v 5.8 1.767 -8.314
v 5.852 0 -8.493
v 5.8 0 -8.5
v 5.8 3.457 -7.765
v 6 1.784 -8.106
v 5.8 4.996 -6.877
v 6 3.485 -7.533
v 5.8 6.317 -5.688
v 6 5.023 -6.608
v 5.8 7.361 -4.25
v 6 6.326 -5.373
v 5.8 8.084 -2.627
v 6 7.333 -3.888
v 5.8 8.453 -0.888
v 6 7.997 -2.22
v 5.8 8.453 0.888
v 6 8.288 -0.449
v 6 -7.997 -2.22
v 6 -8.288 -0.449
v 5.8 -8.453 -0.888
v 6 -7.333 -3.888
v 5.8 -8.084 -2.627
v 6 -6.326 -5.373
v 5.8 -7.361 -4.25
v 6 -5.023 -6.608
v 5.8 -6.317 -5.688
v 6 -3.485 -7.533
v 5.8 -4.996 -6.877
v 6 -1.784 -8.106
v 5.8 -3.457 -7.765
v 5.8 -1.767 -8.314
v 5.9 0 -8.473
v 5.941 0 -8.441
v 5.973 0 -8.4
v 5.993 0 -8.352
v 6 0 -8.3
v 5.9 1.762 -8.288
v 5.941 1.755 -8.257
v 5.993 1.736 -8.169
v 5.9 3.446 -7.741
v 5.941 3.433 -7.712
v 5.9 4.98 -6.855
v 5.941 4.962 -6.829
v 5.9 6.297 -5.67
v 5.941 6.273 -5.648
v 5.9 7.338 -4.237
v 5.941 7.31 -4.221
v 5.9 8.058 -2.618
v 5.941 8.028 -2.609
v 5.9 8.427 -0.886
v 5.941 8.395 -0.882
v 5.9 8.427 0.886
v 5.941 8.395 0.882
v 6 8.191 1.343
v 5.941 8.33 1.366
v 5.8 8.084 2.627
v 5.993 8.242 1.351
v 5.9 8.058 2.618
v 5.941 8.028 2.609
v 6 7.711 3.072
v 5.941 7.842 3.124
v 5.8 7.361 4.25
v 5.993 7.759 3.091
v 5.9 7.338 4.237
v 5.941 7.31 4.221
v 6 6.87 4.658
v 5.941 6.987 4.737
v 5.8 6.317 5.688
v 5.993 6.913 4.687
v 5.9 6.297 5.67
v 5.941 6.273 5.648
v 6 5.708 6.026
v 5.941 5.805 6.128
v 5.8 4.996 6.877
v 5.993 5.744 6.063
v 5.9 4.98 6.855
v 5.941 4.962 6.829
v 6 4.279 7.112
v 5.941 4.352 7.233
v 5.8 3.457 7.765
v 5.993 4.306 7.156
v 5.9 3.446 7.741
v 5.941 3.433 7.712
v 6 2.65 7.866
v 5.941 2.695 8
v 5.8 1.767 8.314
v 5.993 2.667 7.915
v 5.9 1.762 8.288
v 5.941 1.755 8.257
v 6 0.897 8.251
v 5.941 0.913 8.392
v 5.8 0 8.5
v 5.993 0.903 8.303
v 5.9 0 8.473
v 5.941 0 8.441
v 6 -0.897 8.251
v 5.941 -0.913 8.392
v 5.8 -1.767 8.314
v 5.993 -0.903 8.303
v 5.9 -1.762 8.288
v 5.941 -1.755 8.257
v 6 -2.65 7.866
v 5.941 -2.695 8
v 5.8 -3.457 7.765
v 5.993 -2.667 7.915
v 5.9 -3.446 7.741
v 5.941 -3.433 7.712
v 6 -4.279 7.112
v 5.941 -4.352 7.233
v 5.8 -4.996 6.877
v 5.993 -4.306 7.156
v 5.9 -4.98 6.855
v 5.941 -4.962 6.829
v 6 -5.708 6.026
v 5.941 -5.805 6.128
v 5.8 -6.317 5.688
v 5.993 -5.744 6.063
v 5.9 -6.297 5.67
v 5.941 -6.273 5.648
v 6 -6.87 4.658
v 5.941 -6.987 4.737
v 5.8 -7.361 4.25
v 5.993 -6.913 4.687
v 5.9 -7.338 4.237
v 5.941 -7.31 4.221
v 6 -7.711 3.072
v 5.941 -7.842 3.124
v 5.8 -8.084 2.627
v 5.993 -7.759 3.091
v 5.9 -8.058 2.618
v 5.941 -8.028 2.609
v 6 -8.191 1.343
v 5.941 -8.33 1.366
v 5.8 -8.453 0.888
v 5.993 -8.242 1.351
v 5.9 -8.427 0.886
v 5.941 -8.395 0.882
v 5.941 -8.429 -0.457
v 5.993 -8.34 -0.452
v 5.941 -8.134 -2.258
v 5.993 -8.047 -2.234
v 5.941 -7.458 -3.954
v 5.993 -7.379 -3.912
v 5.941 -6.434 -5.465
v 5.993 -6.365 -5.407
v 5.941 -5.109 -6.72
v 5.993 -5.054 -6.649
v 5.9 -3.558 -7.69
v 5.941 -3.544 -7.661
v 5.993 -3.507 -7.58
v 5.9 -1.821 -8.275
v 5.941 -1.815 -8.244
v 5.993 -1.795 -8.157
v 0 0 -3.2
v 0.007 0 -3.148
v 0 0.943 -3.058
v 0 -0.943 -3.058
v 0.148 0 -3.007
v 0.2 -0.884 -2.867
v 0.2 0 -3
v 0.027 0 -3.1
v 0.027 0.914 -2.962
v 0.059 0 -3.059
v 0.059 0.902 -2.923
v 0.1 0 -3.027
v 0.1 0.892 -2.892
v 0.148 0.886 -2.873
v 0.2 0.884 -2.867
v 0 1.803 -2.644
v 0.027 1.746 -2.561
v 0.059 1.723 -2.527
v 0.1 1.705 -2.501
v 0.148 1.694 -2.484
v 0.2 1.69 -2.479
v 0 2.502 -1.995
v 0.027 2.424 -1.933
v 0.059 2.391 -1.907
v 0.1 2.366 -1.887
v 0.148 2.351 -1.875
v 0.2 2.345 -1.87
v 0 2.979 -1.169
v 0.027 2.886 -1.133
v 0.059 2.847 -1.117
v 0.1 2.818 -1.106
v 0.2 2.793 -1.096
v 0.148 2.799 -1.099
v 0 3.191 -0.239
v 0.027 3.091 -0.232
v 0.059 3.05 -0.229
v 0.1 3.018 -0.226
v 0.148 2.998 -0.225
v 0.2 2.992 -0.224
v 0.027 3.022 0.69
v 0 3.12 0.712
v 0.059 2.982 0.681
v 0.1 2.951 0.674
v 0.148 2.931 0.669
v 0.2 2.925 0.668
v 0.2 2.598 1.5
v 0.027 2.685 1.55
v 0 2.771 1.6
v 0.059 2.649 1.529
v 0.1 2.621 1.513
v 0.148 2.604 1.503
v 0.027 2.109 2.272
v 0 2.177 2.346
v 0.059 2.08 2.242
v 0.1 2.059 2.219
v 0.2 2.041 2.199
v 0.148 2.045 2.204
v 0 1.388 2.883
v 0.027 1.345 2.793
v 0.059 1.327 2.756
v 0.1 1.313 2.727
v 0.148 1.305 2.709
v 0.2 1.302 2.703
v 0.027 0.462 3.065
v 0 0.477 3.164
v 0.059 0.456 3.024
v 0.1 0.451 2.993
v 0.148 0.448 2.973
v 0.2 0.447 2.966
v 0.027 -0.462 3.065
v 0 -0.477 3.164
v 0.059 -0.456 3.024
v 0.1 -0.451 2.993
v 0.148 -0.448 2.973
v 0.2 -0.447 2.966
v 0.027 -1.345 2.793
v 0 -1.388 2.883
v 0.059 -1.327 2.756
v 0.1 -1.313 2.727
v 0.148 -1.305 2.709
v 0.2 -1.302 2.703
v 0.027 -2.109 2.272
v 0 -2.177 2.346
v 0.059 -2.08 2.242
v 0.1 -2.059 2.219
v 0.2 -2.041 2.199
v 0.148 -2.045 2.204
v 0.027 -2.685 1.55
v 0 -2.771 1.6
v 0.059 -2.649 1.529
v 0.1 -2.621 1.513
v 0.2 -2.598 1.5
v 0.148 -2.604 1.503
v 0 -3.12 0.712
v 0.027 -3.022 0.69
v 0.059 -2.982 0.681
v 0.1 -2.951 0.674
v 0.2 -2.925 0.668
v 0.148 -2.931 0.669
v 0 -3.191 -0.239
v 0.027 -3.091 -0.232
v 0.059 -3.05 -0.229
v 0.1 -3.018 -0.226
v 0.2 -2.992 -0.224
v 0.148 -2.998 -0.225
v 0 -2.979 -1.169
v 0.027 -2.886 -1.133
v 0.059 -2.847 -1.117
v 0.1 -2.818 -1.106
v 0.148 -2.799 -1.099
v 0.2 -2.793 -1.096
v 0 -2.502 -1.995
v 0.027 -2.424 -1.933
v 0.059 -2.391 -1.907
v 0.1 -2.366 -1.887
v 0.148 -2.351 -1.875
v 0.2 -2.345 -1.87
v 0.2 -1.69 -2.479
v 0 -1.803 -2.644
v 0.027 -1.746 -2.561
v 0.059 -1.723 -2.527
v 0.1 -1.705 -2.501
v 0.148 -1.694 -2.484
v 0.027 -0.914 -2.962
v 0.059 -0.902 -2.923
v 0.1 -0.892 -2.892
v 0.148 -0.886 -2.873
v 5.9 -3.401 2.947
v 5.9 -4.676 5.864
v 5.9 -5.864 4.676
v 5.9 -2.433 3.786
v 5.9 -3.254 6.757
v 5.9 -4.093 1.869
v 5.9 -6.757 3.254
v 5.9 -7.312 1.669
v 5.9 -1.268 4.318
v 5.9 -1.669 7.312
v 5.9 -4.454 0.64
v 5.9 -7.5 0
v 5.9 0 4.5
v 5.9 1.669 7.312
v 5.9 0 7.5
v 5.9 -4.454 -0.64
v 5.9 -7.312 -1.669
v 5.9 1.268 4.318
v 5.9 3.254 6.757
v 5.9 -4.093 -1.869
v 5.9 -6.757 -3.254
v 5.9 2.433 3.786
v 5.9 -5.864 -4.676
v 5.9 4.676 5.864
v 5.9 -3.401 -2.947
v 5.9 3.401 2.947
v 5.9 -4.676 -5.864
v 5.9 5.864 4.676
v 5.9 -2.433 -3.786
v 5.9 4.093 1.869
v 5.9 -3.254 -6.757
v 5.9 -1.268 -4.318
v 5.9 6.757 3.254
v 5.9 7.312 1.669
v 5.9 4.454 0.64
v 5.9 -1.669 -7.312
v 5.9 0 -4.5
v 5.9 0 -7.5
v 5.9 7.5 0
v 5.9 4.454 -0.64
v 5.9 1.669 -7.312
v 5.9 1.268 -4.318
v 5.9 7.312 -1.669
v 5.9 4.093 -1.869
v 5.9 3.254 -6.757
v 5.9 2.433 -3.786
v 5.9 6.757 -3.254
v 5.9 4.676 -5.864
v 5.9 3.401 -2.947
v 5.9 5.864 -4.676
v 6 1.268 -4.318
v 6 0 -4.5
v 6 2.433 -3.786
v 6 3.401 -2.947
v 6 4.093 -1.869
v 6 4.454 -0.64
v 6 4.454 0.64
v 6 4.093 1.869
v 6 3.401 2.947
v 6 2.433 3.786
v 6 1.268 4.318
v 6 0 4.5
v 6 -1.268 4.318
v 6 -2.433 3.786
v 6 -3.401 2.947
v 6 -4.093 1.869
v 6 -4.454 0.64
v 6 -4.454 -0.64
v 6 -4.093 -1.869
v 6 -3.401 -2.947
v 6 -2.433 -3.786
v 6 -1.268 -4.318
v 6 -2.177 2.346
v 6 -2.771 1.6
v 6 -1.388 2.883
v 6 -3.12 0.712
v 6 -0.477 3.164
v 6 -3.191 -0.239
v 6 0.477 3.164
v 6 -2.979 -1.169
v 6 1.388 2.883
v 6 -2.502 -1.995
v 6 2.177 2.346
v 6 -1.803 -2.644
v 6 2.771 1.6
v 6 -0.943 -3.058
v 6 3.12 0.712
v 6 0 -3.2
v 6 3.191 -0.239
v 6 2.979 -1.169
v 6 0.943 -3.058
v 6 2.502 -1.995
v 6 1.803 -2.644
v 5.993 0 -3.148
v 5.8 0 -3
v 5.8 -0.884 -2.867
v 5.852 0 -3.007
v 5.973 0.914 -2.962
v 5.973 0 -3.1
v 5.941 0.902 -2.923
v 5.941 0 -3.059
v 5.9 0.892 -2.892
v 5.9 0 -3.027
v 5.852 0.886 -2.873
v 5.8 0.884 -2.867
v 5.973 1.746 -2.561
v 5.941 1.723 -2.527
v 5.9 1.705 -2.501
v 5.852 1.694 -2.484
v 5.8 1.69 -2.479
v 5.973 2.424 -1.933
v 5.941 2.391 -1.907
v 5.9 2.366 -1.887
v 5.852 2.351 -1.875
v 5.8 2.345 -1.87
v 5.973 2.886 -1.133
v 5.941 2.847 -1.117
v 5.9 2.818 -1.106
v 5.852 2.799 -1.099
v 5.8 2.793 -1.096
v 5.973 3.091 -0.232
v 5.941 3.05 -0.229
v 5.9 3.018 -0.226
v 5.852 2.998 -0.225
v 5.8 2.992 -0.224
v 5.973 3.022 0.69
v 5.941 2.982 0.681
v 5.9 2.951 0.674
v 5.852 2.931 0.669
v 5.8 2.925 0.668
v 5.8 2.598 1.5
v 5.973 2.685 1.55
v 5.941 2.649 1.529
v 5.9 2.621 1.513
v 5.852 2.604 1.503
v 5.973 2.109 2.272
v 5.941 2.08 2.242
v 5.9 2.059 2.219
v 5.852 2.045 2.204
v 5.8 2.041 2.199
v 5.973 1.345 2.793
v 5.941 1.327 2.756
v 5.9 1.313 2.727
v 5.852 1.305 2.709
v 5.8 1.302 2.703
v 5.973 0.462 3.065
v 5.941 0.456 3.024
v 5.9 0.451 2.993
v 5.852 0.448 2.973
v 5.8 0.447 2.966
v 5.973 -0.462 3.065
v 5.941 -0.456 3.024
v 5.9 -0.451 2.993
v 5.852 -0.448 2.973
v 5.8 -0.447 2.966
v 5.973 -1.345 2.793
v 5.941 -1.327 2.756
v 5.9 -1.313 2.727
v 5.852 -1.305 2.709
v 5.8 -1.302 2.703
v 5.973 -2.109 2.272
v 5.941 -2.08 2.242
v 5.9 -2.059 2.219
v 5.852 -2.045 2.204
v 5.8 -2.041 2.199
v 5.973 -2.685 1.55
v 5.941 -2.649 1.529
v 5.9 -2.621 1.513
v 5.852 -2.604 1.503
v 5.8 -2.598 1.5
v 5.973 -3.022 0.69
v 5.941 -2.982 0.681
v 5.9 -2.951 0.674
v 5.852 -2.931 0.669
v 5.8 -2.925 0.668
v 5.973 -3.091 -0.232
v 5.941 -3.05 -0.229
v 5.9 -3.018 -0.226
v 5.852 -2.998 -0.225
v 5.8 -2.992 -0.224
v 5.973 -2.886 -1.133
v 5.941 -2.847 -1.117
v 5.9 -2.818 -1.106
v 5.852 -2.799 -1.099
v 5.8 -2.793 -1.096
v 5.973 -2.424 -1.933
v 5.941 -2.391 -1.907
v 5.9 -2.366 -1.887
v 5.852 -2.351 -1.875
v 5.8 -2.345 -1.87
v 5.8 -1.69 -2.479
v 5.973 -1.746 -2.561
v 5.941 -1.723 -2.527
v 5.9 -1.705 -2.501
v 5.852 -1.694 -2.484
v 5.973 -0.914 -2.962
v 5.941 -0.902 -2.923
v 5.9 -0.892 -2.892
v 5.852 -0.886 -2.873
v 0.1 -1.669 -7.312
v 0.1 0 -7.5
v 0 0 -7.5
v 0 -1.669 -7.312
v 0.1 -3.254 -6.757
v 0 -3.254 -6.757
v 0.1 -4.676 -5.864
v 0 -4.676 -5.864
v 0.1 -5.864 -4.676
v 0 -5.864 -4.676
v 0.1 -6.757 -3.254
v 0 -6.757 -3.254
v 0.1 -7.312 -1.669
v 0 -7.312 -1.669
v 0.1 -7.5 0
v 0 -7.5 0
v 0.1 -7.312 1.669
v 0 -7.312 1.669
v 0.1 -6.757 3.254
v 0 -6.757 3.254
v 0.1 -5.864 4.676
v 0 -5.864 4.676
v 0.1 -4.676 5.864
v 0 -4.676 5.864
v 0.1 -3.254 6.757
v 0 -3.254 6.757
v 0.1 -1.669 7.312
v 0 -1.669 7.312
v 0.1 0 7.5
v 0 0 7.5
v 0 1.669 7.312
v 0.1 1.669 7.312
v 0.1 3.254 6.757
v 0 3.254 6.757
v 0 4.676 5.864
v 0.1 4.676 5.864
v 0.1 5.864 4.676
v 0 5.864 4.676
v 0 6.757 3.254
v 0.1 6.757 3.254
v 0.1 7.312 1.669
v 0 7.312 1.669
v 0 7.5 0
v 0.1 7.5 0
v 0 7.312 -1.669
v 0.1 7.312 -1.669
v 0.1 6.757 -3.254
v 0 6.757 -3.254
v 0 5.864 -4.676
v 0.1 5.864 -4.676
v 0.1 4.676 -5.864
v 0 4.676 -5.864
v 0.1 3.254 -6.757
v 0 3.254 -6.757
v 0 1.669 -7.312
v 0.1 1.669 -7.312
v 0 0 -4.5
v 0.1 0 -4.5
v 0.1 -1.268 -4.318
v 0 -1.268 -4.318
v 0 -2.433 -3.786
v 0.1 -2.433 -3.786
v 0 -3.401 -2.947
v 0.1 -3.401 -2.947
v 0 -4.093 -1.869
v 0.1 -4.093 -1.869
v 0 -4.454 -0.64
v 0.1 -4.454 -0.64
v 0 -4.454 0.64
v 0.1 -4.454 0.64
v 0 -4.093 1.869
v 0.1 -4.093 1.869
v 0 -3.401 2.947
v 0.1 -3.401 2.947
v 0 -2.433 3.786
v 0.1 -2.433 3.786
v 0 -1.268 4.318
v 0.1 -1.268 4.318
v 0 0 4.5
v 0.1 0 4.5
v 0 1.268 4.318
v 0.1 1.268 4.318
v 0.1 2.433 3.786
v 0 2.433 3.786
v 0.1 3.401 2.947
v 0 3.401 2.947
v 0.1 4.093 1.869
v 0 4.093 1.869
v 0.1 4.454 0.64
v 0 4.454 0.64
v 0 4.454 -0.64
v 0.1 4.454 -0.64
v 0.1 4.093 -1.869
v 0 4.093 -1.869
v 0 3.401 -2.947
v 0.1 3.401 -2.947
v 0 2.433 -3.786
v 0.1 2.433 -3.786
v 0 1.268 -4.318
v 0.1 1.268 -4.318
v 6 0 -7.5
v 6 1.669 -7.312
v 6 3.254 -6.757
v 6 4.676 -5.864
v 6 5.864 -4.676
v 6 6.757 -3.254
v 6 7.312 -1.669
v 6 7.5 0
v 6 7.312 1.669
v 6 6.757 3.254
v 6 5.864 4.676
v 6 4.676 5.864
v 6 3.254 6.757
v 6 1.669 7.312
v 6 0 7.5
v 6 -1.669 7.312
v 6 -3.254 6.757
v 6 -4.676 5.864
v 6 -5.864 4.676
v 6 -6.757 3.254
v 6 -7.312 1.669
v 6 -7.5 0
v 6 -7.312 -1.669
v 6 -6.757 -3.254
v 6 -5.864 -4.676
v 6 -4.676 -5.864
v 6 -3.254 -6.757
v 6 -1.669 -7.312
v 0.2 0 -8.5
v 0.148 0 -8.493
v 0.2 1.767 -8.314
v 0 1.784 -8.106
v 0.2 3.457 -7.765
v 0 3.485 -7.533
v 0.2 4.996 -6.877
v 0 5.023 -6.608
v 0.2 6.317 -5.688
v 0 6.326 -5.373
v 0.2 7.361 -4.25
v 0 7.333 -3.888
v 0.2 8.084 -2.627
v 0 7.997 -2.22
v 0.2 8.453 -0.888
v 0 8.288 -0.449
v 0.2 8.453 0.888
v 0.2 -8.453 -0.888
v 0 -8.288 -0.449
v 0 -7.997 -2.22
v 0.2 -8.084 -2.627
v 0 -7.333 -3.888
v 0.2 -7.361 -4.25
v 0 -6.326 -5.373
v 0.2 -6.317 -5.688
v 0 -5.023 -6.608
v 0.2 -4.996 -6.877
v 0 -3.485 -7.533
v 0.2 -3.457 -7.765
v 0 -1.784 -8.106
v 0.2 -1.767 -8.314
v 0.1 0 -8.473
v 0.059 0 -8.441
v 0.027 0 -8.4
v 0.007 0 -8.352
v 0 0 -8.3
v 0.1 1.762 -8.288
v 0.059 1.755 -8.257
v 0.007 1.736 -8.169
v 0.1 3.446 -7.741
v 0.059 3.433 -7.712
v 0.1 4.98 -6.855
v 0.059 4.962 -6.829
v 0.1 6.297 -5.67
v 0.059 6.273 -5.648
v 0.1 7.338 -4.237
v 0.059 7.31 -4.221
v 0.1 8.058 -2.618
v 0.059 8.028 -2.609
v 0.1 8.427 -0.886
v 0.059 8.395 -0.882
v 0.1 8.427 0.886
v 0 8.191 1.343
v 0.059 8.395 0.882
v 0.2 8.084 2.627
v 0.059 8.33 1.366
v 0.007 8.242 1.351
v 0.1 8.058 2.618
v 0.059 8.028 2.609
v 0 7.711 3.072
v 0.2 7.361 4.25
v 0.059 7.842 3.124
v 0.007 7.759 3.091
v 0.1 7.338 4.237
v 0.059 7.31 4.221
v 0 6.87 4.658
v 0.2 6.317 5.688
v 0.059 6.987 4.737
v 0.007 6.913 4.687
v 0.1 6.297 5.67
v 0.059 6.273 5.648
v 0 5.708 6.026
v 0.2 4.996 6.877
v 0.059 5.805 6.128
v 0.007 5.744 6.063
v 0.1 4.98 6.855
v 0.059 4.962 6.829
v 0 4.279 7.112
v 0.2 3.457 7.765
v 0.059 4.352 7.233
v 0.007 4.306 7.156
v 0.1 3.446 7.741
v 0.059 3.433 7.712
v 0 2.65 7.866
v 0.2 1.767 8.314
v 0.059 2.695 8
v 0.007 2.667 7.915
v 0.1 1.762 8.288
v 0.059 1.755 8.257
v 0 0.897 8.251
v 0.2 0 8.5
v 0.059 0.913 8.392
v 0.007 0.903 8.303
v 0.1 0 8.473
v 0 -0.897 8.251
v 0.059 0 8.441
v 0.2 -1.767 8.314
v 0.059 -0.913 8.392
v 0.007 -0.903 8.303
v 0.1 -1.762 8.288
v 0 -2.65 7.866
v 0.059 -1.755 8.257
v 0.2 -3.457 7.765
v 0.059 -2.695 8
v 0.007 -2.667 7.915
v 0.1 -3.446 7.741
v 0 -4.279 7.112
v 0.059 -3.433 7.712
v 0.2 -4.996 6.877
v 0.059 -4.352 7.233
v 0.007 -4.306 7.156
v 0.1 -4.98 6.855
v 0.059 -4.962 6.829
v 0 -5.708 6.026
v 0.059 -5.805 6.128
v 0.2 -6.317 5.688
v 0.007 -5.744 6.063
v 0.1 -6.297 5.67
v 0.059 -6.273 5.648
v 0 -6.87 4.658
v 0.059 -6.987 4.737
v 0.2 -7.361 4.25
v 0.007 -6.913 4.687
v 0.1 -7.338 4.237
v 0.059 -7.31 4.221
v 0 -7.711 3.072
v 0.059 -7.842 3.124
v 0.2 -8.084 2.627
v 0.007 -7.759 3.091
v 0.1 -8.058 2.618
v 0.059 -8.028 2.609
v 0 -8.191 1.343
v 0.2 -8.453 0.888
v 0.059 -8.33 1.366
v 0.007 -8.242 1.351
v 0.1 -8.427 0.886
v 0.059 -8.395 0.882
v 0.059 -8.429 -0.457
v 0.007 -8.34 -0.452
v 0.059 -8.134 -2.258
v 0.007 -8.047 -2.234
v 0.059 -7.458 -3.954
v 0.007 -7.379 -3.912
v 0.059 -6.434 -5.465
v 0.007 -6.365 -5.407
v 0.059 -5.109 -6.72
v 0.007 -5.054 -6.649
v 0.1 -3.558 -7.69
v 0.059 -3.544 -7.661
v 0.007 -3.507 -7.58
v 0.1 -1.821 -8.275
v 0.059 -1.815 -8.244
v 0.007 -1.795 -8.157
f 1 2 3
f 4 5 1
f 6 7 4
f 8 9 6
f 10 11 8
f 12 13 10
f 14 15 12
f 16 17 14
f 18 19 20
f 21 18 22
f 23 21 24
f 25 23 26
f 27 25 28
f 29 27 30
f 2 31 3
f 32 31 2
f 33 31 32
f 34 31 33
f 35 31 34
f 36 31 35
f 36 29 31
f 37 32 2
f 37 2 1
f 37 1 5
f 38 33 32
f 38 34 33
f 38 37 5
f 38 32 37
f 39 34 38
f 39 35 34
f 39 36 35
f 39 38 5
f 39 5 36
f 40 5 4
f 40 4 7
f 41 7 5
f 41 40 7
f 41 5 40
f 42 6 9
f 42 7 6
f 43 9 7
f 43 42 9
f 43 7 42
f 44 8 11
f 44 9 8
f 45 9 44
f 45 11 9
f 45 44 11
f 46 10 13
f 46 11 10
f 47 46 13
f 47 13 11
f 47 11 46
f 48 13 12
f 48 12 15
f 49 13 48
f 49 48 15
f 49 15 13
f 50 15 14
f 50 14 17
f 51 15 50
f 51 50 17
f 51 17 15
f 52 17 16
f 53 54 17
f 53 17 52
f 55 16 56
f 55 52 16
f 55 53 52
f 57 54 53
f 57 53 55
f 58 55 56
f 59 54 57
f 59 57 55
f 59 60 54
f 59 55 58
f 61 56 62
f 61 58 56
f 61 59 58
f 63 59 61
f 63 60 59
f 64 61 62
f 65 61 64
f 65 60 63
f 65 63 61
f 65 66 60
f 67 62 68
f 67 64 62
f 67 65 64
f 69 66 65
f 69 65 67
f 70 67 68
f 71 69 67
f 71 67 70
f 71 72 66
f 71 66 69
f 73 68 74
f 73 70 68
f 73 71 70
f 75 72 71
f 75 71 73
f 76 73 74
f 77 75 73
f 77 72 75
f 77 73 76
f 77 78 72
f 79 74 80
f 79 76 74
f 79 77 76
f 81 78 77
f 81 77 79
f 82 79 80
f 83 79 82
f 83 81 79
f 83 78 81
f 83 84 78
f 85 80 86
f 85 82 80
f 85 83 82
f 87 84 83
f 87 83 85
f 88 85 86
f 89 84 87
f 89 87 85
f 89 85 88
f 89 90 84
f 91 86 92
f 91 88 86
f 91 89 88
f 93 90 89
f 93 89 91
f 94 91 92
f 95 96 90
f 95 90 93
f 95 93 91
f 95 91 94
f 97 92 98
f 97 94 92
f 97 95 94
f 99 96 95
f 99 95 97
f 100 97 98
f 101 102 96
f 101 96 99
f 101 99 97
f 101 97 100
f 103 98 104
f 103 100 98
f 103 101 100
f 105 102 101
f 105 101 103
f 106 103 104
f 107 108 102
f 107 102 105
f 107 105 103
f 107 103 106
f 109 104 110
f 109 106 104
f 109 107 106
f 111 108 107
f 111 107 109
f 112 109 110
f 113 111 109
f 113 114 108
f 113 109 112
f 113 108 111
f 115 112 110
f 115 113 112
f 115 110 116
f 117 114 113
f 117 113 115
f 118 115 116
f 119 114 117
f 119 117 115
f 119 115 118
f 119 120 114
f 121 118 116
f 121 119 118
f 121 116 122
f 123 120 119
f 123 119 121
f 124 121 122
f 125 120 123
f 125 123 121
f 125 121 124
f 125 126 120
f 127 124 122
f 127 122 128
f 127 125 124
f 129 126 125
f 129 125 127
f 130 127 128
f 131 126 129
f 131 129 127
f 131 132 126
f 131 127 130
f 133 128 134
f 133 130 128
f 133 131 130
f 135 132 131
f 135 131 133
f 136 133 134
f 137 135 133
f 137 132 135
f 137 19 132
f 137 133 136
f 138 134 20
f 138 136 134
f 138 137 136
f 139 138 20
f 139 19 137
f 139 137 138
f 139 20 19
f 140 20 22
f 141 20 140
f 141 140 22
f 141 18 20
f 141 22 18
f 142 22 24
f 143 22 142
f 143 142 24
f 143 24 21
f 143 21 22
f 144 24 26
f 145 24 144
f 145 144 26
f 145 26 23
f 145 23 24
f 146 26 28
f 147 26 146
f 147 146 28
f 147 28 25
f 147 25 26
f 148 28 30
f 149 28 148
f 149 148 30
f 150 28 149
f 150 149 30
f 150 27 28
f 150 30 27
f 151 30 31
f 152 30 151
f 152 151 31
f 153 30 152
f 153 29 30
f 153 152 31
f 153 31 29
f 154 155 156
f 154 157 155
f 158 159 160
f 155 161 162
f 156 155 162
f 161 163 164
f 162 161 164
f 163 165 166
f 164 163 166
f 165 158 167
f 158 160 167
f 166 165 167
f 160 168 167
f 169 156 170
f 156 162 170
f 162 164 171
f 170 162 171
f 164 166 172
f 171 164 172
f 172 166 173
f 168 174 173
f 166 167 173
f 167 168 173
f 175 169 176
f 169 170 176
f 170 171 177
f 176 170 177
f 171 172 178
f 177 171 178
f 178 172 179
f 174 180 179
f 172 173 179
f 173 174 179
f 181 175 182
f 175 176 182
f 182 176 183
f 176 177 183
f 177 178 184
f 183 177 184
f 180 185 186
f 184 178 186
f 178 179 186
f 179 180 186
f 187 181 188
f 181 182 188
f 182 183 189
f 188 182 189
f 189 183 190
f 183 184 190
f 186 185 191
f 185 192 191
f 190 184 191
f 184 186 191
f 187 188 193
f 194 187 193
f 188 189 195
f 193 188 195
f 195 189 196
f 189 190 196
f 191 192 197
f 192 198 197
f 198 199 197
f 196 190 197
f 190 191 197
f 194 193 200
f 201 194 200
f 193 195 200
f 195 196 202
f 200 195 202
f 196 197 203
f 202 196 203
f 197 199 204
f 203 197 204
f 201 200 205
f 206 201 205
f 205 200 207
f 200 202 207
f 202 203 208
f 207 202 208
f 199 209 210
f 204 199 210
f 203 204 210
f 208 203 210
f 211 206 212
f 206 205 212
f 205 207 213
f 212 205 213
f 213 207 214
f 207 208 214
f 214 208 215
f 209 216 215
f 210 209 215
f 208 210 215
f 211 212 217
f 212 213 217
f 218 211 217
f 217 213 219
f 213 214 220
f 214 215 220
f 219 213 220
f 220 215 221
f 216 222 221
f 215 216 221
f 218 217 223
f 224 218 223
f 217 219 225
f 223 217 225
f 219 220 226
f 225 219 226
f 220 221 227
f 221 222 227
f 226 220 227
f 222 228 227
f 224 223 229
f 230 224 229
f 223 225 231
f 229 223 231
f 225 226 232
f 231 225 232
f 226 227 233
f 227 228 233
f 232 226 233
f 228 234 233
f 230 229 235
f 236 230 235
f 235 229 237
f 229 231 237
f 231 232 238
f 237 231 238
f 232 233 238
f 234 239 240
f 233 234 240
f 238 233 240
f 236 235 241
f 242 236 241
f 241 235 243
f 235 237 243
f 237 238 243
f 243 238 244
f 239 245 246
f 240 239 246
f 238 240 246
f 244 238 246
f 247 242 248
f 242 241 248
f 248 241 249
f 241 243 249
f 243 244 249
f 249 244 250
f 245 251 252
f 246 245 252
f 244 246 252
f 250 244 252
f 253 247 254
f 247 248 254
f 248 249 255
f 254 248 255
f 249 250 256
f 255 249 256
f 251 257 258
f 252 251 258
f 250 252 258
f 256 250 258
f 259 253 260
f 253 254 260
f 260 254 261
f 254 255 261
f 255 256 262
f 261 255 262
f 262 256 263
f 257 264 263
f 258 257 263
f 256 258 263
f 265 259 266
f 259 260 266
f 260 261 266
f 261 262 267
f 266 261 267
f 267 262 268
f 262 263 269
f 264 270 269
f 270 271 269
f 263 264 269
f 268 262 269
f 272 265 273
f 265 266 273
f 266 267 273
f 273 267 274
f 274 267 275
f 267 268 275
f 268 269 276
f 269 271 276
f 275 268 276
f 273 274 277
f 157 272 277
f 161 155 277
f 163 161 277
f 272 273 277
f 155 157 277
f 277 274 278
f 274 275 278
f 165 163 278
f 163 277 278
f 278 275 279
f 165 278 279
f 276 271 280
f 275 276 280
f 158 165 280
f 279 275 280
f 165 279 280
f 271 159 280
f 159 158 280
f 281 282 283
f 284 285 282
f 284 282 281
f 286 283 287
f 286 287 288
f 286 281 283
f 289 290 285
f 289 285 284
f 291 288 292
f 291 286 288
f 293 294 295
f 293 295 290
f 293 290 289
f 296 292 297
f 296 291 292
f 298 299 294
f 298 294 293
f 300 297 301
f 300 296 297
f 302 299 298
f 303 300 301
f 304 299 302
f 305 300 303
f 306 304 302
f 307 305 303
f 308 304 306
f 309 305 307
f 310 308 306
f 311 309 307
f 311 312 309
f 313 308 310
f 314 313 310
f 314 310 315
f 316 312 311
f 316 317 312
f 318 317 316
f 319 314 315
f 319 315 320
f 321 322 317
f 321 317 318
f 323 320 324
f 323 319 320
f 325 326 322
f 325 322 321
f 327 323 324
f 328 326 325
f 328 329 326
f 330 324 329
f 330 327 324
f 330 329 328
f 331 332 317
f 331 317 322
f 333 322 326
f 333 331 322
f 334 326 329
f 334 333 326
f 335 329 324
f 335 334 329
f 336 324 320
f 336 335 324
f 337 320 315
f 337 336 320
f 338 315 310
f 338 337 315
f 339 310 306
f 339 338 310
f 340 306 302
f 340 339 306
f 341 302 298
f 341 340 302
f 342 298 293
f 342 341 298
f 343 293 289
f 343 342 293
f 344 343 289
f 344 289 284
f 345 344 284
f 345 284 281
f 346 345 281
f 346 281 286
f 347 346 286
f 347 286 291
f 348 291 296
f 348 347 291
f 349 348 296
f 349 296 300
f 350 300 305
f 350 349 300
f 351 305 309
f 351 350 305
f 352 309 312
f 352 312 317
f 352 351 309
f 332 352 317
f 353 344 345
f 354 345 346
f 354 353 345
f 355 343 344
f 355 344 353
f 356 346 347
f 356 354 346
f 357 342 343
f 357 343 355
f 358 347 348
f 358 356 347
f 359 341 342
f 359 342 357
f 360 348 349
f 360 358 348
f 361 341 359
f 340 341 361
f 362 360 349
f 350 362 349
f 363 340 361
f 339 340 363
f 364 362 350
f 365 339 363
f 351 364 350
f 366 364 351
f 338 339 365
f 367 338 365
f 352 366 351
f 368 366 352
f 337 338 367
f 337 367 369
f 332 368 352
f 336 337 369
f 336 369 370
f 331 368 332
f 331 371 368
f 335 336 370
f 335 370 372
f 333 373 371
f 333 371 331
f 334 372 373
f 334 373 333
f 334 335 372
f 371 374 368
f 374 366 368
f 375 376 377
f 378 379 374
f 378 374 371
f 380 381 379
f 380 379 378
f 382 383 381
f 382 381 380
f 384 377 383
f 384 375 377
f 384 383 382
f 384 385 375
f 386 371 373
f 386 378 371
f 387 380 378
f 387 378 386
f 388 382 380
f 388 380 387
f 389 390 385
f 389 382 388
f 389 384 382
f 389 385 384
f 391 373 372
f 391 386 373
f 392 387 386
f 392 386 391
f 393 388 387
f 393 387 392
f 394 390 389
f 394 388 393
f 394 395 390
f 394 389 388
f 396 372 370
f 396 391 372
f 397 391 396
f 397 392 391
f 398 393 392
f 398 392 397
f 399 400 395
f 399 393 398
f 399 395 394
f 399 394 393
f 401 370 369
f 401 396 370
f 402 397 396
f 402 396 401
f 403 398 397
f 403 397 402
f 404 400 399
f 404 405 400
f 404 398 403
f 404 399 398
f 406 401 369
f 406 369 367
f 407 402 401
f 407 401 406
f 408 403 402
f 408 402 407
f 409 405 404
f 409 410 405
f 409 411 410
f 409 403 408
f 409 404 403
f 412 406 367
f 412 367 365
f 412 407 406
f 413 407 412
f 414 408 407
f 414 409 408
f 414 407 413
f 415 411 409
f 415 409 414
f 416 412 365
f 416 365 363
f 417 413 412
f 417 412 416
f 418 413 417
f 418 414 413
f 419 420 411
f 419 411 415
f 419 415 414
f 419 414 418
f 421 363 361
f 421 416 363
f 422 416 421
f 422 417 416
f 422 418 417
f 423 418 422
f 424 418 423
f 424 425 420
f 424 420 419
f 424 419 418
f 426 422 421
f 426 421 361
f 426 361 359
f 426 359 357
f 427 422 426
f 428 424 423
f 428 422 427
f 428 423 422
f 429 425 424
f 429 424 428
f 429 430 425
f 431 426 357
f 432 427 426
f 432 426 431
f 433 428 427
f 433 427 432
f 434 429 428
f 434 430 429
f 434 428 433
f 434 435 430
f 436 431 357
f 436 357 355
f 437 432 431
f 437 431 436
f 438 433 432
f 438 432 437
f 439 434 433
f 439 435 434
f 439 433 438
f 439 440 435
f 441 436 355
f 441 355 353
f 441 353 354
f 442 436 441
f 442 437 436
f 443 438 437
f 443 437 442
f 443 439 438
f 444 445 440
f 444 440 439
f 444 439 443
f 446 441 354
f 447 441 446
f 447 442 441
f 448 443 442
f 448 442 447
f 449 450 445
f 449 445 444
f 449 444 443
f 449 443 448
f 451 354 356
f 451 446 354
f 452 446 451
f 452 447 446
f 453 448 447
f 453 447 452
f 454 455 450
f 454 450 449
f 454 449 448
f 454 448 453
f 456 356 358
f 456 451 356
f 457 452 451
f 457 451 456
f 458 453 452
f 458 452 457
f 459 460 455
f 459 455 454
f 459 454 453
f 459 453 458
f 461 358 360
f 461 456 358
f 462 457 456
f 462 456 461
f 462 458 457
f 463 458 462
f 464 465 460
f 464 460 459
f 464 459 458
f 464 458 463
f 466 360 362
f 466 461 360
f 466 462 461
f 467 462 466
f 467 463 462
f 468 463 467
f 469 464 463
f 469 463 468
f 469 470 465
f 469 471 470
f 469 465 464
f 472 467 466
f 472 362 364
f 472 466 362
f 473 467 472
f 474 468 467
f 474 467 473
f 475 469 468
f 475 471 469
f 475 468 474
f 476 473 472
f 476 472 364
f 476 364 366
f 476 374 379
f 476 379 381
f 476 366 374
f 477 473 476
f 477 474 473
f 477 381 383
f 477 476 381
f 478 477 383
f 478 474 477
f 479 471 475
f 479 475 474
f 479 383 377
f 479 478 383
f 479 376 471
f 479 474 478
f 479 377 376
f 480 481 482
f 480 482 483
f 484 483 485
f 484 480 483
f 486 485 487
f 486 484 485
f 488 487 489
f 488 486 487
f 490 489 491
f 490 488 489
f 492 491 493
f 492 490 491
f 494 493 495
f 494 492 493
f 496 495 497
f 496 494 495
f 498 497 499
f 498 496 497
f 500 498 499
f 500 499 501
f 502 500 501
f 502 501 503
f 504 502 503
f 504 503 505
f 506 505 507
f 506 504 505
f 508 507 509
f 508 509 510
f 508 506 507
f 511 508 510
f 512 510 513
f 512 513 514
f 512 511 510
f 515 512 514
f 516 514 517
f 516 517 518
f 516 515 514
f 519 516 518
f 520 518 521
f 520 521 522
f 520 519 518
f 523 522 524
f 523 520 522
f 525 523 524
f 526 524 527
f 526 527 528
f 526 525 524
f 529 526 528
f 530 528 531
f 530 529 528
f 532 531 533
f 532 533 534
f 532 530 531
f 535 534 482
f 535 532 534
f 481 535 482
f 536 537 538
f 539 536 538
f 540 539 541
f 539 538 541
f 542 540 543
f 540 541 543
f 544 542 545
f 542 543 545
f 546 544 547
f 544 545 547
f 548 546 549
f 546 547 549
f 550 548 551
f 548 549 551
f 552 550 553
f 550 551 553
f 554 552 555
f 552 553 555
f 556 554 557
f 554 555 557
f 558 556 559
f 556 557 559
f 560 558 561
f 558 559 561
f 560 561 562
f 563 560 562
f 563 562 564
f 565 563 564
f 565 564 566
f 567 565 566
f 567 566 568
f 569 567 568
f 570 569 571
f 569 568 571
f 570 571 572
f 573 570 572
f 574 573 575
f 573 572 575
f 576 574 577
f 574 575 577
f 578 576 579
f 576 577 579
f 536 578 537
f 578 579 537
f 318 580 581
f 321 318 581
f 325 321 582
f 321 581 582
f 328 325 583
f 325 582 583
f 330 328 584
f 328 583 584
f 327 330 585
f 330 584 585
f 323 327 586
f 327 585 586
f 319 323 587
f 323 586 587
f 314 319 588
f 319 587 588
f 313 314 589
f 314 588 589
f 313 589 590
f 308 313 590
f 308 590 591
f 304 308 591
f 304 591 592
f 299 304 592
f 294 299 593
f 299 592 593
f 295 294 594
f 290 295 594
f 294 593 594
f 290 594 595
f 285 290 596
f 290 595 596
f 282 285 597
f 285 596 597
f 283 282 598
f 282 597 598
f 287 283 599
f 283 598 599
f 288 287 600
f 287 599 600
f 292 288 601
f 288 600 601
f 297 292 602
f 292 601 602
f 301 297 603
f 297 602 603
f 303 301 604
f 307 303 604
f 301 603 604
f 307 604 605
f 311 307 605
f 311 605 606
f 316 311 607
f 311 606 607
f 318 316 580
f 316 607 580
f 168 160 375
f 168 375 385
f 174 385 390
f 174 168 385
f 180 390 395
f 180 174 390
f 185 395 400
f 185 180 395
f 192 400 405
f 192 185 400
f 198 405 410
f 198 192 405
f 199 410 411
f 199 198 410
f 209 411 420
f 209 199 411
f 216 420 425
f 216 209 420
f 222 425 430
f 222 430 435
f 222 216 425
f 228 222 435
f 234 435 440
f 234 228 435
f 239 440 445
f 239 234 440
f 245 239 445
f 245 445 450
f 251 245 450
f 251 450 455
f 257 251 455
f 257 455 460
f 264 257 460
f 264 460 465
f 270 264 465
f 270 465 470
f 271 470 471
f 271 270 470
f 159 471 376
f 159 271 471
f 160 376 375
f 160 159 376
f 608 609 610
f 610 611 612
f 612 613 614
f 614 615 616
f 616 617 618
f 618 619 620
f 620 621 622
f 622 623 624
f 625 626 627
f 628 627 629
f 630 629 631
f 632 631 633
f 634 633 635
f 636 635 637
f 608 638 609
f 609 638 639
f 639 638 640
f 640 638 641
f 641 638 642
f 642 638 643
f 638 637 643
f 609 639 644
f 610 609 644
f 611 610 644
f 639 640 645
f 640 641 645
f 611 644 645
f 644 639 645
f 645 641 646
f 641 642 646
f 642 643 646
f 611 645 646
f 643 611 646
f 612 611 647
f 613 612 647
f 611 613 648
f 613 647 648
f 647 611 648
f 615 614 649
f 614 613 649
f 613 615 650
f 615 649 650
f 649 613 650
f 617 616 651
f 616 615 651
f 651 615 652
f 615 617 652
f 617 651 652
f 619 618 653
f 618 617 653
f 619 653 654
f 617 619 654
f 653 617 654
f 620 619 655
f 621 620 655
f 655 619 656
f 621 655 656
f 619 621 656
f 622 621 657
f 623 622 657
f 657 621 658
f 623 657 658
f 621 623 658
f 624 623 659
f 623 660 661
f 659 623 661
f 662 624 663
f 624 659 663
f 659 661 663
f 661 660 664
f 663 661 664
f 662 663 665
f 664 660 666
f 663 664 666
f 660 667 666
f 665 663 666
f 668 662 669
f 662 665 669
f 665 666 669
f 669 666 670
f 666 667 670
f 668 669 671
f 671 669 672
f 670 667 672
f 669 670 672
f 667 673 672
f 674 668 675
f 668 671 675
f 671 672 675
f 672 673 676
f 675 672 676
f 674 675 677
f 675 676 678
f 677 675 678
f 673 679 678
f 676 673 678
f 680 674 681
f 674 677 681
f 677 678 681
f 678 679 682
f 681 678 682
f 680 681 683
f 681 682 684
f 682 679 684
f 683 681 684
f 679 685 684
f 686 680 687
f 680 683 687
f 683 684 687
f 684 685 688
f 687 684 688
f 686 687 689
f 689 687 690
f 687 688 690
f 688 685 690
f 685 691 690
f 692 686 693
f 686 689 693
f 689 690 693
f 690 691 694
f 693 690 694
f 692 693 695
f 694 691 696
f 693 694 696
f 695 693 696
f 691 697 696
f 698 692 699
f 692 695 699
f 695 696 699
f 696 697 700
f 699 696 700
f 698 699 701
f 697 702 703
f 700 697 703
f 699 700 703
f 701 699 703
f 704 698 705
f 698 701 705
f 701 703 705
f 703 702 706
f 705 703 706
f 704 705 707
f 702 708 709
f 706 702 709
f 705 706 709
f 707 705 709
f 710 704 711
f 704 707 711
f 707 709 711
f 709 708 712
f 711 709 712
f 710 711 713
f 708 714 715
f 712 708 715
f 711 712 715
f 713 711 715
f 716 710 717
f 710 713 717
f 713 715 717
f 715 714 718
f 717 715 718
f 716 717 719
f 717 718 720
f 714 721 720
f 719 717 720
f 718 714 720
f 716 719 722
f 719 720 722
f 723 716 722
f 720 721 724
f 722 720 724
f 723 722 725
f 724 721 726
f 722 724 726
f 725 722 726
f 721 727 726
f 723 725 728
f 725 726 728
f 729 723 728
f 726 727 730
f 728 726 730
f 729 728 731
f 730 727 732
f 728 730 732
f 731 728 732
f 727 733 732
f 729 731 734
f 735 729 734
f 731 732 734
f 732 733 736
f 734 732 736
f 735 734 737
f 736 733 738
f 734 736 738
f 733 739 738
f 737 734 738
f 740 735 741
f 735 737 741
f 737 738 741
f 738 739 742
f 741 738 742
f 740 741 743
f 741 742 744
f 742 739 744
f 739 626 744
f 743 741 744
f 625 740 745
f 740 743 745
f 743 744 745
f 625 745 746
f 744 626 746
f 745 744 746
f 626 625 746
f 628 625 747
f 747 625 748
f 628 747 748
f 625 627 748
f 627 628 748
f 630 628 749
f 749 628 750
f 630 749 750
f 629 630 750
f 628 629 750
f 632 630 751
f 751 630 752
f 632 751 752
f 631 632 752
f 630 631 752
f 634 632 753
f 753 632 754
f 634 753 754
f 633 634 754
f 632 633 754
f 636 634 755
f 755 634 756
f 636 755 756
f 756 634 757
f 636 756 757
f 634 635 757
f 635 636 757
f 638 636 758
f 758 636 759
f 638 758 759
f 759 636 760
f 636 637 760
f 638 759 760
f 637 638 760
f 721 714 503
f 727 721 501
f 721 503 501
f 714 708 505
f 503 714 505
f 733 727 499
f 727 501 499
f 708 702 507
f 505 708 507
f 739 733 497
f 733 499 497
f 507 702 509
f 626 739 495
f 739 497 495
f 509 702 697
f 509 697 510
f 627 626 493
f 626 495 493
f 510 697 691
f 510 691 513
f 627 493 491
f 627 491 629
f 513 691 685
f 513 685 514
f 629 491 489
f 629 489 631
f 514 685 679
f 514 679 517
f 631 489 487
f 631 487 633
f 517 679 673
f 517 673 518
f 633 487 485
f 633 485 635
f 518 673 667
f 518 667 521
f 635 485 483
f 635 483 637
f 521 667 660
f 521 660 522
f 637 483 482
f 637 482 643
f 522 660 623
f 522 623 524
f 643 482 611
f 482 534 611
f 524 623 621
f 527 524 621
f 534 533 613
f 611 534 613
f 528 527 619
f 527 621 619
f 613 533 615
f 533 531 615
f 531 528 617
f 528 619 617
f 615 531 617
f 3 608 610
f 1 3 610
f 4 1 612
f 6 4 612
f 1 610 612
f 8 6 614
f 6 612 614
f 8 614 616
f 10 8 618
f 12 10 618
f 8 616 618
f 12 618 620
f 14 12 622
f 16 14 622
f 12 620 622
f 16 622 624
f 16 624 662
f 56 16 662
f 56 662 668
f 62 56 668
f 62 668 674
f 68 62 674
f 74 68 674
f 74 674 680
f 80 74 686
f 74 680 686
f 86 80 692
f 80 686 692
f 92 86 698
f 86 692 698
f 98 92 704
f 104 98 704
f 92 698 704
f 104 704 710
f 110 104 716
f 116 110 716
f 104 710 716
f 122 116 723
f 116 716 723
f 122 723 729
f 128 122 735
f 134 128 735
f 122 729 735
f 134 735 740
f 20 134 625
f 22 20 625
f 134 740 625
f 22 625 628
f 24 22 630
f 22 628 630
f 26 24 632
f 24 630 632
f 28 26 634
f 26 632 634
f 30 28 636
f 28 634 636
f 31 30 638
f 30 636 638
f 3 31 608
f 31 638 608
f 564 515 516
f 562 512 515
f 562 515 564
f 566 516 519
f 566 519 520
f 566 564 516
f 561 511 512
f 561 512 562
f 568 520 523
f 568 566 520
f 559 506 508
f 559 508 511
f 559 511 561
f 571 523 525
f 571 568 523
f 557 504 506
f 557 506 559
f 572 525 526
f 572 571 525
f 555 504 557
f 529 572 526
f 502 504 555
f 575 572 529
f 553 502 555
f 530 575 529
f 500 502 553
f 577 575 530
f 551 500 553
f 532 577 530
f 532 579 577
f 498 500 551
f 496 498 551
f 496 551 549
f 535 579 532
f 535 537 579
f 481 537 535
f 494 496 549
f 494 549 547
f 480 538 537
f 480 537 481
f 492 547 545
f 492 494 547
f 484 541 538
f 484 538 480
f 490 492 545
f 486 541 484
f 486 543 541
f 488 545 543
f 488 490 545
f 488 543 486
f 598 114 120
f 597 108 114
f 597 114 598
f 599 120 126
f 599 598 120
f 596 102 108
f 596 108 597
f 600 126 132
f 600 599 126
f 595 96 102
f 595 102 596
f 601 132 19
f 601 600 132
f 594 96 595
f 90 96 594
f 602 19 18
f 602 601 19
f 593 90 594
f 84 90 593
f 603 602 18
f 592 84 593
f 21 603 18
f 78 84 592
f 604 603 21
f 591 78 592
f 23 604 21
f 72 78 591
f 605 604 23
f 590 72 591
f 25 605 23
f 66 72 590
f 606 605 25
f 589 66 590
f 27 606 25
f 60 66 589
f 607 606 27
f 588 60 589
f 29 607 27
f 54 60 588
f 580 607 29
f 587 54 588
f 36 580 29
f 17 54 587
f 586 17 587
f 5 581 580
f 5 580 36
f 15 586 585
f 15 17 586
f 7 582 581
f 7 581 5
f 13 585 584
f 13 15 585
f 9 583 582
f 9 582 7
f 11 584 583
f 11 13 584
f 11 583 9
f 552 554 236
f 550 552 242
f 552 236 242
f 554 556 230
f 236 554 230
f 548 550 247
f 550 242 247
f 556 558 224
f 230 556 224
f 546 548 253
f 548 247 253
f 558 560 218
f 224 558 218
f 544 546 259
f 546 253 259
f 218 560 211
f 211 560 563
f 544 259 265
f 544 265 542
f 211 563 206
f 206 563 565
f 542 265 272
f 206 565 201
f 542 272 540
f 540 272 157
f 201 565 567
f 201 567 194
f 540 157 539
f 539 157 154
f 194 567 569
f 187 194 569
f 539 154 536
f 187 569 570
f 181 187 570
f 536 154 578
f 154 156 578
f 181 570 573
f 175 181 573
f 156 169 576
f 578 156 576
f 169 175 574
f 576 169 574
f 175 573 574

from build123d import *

# Parameters (mm, degrees)
SKETCH1_R           = 8.5
SKETCH1_R_2         = 3
BOSS_EXTRUDE1_DEPTH = 6
SKETCH2_R           = 7.5
SKETCH2_R_2         = 4.5
CUT_EXTRUDE1_DEPTH  = 0.1
CUT_EXTRUDE2_START  = -0.1
SKETCH3_R           = 7.5
SKETCH3_R_2         = 4.5
CUT_EXTRUDE2_DEPTH  = 0.1
FILLET1_R           = 0.2


with BuildPart() as part:
    # Sketch1 → Boss-Extrude1 (new body)
    with BuildSketch(Plane(origin=(0, 0, 0), x_dir=(0, 0, -1), z_dir=(1, 0, 0))):
        Circle(SKETCH1_R)
        Circle(SKETCH1_R_2, mode=Mode.SUBTRACT)
    extrude(amount=BOSS_EXTRUDE1_DEPTH)

    # Sketch2 → Cut-Extrude1 (cut)
    with BuildSketch(Plane(origin=(6, 0, 0), x_dir=(0, 0, -1), z_dir=(1, 0, 0))):
        Circle(SKETCH2_R)
        Circle(SKETCH2_R_2, mode=Mode.SUBTRACT)
    extrude(amount=-CUT_EXTRUDE1_DEPTH, mode=Mode.SUBTRACT)

    # Sketch3 → Cut-Extrude2 (cut)
    with BuildSketch(Plane.ZY.offset(CUT_EXTRUDE2_START)):
        with Locations(Location((0, 0, 0), (0, 0, 180))):
            Circle(SKETCH3_R)
        with Locations(Location((0, 0, 0), (0, 0, 180))):
            Circle(SKETCH3_R_2, mode=Mode.SUBTRACT)
    extrude(amount=CUT_EXTRUDE2_DEPTH, mode=Mode.SUBTRACT)

    # Fillet1
    fillet1_edges = [part.edges().sort_by_distance(p)[0] for p in [
        (0, 0, 8.5),
        (6, 0, 8.5),
        (0, 0, 3),
        (6, 0, 3),
    ]]
    fillet(fillet1_edges, radius=FILLET1_R)


solid = part.part
